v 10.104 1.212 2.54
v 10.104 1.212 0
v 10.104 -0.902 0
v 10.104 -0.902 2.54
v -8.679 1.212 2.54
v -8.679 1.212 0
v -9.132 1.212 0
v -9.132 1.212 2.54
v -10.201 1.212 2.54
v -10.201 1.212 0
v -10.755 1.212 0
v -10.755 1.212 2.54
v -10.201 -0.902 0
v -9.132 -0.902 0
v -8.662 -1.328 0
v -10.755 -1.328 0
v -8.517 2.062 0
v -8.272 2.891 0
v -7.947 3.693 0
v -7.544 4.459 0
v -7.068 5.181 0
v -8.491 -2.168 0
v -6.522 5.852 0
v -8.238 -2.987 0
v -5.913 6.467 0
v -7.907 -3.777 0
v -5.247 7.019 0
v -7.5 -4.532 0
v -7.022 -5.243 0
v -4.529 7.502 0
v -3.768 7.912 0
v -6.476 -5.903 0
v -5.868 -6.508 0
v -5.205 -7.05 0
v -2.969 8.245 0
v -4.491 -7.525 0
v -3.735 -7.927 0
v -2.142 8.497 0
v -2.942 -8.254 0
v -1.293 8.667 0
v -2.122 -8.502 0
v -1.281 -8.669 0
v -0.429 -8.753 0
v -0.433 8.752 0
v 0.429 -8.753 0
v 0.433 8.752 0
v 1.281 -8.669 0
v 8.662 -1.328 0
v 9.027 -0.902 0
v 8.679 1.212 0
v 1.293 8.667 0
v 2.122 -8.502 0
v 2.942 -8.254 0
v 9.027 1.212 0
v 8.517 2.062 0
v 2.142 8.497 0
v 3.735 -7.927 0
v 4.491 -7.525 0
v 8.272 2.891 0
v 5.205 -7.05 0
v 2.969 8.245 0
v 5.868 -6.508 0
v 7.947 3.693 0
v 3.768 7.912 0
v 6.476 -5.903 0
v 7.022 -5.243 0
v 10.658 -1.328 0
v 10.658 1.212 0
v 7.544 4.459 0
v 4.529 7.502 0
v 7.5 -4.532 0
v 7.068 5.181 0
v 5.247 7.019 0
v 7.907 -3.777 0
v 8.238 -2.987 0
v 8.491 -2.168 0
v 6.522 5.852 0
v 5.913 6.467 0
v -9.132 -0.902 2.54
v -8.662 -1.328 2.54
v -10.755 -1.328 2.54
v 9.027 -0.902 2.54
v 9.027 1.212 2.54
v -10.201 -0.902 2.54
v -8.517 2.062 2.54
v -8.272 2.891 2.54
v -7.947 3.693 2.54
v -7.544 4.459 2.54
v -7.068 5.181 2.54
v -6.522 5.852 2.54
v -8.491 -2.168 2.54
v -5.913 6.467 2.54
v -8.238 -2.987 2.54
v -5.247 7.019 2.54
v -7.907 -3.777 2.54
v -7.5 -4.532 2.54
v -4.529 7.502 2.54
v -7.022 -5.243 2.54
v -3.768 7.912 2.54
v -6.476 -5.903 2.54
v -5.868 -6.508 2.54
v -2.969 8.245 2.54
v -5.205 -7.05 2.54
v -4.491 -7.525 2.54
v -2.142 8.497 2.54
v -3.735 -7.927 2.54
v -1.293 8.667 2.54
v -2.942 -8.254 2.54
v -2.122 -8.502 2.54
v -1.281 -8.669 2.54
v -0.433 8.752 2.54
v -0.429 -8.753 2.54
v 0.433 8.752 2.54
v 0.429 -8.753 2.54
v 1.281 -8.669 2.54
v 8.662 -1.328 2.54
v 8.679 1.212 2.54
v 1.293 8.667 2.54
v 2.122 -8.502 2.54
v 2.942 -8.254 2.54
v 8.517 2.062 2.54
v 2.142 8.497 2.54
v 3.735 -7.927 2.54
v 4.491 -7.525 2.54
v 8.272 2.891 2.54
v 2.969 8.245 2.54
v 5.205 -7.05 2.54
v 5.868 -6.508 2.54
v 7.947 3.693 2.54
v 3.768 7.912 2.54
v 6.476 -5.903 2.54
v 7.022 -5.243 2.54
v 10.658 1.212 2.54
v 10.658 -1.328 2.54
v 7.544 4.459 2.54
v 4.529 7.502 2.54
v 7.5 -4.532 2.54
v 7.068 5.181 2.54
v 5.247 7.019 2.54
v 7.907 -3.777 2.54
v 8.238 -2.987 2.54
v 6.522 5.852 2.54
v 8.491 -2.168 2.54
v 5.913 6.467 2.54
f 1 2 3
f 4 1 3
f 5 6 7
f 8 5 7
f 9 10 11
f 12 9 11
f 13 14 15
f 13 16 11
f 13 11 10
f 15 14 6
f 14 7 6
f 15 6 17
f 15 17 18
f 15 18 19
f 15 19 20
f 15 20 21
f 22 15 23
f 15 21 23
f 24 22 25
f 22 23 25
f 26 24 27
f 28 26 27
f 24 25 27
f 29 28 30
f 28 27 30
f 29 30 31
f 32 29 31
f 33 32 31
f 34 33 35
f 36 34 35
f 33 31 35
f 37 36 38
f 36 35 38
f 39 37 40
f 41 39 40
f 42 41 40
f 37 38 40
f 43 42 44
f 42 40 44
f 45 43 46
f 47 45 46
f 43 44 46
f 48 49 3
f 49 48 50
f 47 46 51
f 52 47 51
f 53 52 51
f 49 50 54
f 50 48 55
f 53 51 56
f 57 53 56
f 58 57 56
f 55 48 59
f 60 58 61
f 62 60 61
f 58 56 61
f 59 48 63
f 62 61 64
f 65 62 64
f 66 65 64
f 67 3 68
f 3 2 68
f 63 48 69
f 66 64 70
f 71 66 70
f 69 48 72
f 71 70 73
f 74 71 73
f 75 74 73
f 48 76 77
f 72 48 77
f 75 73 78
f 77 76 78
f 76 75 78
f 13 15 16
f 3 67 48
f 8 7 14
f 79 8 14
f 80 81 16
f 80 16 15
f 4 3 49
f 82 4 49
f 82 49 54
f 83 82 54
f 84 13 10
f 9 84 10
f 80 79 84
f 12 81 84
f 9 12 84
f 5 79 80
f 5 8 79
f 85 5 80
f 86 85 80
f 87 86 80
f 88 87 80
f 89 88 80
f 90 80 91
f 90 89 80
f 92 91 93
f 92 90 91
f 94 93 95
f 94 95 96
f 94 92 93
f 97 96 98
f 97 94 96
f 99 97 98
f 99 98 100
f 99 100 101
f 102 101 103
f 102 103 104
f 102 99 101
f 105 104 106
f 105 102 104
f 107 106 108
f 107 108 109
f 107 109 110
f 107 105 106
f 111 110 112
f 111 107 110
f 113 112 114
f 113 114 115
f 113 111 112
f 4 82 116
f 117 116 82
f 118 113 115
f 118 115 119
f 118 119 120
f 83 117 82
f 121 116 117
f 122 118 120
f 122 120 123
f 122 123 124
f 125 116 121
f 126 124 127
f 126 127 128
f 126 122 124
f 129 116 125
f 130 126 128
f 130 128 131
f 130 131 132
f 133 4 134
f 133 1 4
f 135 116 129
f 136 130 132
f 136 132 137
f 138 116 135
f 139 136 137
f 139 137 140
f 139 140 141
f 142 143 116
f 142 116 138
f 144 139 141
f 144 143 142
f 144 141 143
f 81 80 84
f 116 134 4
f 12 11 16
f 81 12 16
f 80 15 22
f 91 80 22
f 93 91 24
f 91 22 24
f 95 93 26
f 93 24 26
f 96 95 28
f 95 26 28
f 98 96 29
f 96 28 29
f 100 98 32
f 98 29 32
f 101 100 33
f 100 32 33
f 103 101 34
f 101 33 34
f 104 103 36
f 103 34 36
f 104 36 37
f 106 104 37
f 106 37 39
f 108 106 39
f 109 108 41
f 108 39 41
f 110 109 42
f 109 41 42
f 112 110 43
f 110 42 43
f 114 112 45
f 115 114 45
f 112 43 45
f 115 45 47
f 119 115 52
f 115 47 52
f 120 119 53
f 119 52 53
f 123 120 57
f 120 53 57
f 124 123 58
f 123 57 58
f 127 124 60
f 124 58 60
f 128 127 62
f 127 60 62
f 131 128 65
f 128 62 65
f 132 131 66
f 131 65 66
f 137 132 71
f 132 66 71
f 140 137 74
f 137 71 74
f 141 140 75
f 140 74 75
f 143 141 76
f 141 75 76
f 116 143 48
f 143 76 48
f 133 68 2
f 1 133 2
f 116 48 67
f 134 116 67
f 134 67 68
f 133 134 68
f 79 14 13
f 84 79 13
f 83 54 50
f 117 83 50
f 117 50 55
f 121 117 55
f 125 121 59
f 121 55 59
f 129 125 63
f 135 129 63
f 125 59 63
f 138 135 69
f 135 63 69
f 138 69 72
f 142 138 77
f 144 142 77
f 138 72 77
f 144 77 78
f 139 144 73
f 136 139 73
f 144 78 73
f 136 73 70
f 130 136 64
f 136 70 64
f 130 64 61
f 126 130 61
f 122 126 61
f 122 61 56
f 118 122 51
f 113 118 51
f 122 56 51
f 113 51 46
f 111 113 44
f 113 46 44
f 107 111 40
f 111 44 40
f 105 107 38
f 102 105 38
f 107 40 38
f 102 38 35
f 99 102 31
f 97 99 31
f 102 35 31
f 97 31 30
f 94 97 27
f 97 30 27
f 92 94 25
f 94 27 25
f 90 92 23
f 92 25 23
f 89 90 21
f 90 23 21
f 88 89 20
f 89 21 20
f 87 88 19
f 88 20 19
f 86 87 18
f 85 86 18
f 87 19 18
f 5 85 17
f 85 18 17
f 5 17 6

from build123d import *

# Parameters (mm, degrees)
F1_DEPTH = 2.54


with BuildPart() as f1:
    # F0 (on Top) → F1 (new body)
    with BuildSketch(Plane.XY):
        with BuildLine():
            ThreePointArc((8.6617718357, -1.3281105626), (8.7376563104, -0.6659813826), (8.763, 0))
            ThreePointArc((8.763, 0), (8.7419235528, 0.6074056285), (8.6787955957, 1.2118894374))
            Line((8.6787955957, 1.2118894374), (-8.6787955957, 1.2118894374))
            ThreePointArc((-8.6787955957, 1.2118894374), (-8.7628031879, -0.0587306529), (-8.6617718357, -1.3281105626))
            Line((-8.6617718357, -1.3281105626), (8.6617718357, -1.3281105626))
        make_face()
        with BuildLine():
            Line((-8.6787955957, 1.2118894374), (8.6787955957, 1.2118894374))
            ThreePointArc((8.6787955957, 1.2118894374), (0, 8.763), (-8.6787955957, 1.2118894374))
        make_face()
        with BuildLine():
            ThreePointArc((-8.6617718357, -1.3281105626), (0, -8.763), (8.6617718357, -1.3281105626))
            Line((8.6617718357, -1.3281105626), (-8.6617718357, -1.3281105626))
        make_face()
        with BuildLine():
            ThreePointArc((8.6787955957, 1.2118894374), (8.7419235528, 0.6074056285), (8.763, 0))
            ThreePointArc((8.763, 0), (8.7376563104, -0.6659813826), (8.6617718357, -1.3281105626))
            Line((8.6617718357, -1.3281105626), (10.6583032757, -1.3281105626))
            Line((10.6583032757, -1.3281105626), (10.6583032757, 1.2118894374))
            Line((10.6583032757, 1.2118894374), (10.1039223373, 1.2118894374))
            Line((10.1039223373, 1.2118894374), (10.1039223373, -0.9020056459))
            Line((10.1039223373, -0.9020056459), (9.0270256624, -0.9020056459))
            Line((9.0270256624, -0.9020056459), (9.0270256624, 1.2118894374))
            Line((9.0270256624, 1.2118894374), (8.6787955957, 1.2118894374))
        make_face()
        with BuildLine():
            ThreePointArc((-8.6617718357, -1.3281105626), (-8.7628031879, -0.0587306529), (-8.6787955957, 1.2118894374))
            Line((-8.6787955957, 1.2118894374), (-9.1322259977, 1.2118894374))
            Line((-9.1322259977, 1.2118894374), (-9.1322259977, 1.1553943541))
            Line((-9.1322259977, 1.1553943541), (-9.1322259977, -0.9020056459))
            Line((-9.1322259977, -0.9020056459), (-10.2012958378, -0.9020056459))
            Line((-10.2012958378, -0.9020056459), (-10.2012958378, 1.1553943541))
            Line((-10.2012958378, 1.1553943541), (-10.2012958378, 1.2118894374))
            Line((-10.2012958378, 1.2118894374), (-10.7550928369, 1.2118894374))
            Line((-10.7550928369, 1.2118894374), (-10.7550928369, -1.3281105626))
            Line((-10.7550928369, -1.3281105626), (-8.6617718357, -1.3281105626))
        make_face()
    extrude(amount=F1_DEPTH)


solid = f1.part
